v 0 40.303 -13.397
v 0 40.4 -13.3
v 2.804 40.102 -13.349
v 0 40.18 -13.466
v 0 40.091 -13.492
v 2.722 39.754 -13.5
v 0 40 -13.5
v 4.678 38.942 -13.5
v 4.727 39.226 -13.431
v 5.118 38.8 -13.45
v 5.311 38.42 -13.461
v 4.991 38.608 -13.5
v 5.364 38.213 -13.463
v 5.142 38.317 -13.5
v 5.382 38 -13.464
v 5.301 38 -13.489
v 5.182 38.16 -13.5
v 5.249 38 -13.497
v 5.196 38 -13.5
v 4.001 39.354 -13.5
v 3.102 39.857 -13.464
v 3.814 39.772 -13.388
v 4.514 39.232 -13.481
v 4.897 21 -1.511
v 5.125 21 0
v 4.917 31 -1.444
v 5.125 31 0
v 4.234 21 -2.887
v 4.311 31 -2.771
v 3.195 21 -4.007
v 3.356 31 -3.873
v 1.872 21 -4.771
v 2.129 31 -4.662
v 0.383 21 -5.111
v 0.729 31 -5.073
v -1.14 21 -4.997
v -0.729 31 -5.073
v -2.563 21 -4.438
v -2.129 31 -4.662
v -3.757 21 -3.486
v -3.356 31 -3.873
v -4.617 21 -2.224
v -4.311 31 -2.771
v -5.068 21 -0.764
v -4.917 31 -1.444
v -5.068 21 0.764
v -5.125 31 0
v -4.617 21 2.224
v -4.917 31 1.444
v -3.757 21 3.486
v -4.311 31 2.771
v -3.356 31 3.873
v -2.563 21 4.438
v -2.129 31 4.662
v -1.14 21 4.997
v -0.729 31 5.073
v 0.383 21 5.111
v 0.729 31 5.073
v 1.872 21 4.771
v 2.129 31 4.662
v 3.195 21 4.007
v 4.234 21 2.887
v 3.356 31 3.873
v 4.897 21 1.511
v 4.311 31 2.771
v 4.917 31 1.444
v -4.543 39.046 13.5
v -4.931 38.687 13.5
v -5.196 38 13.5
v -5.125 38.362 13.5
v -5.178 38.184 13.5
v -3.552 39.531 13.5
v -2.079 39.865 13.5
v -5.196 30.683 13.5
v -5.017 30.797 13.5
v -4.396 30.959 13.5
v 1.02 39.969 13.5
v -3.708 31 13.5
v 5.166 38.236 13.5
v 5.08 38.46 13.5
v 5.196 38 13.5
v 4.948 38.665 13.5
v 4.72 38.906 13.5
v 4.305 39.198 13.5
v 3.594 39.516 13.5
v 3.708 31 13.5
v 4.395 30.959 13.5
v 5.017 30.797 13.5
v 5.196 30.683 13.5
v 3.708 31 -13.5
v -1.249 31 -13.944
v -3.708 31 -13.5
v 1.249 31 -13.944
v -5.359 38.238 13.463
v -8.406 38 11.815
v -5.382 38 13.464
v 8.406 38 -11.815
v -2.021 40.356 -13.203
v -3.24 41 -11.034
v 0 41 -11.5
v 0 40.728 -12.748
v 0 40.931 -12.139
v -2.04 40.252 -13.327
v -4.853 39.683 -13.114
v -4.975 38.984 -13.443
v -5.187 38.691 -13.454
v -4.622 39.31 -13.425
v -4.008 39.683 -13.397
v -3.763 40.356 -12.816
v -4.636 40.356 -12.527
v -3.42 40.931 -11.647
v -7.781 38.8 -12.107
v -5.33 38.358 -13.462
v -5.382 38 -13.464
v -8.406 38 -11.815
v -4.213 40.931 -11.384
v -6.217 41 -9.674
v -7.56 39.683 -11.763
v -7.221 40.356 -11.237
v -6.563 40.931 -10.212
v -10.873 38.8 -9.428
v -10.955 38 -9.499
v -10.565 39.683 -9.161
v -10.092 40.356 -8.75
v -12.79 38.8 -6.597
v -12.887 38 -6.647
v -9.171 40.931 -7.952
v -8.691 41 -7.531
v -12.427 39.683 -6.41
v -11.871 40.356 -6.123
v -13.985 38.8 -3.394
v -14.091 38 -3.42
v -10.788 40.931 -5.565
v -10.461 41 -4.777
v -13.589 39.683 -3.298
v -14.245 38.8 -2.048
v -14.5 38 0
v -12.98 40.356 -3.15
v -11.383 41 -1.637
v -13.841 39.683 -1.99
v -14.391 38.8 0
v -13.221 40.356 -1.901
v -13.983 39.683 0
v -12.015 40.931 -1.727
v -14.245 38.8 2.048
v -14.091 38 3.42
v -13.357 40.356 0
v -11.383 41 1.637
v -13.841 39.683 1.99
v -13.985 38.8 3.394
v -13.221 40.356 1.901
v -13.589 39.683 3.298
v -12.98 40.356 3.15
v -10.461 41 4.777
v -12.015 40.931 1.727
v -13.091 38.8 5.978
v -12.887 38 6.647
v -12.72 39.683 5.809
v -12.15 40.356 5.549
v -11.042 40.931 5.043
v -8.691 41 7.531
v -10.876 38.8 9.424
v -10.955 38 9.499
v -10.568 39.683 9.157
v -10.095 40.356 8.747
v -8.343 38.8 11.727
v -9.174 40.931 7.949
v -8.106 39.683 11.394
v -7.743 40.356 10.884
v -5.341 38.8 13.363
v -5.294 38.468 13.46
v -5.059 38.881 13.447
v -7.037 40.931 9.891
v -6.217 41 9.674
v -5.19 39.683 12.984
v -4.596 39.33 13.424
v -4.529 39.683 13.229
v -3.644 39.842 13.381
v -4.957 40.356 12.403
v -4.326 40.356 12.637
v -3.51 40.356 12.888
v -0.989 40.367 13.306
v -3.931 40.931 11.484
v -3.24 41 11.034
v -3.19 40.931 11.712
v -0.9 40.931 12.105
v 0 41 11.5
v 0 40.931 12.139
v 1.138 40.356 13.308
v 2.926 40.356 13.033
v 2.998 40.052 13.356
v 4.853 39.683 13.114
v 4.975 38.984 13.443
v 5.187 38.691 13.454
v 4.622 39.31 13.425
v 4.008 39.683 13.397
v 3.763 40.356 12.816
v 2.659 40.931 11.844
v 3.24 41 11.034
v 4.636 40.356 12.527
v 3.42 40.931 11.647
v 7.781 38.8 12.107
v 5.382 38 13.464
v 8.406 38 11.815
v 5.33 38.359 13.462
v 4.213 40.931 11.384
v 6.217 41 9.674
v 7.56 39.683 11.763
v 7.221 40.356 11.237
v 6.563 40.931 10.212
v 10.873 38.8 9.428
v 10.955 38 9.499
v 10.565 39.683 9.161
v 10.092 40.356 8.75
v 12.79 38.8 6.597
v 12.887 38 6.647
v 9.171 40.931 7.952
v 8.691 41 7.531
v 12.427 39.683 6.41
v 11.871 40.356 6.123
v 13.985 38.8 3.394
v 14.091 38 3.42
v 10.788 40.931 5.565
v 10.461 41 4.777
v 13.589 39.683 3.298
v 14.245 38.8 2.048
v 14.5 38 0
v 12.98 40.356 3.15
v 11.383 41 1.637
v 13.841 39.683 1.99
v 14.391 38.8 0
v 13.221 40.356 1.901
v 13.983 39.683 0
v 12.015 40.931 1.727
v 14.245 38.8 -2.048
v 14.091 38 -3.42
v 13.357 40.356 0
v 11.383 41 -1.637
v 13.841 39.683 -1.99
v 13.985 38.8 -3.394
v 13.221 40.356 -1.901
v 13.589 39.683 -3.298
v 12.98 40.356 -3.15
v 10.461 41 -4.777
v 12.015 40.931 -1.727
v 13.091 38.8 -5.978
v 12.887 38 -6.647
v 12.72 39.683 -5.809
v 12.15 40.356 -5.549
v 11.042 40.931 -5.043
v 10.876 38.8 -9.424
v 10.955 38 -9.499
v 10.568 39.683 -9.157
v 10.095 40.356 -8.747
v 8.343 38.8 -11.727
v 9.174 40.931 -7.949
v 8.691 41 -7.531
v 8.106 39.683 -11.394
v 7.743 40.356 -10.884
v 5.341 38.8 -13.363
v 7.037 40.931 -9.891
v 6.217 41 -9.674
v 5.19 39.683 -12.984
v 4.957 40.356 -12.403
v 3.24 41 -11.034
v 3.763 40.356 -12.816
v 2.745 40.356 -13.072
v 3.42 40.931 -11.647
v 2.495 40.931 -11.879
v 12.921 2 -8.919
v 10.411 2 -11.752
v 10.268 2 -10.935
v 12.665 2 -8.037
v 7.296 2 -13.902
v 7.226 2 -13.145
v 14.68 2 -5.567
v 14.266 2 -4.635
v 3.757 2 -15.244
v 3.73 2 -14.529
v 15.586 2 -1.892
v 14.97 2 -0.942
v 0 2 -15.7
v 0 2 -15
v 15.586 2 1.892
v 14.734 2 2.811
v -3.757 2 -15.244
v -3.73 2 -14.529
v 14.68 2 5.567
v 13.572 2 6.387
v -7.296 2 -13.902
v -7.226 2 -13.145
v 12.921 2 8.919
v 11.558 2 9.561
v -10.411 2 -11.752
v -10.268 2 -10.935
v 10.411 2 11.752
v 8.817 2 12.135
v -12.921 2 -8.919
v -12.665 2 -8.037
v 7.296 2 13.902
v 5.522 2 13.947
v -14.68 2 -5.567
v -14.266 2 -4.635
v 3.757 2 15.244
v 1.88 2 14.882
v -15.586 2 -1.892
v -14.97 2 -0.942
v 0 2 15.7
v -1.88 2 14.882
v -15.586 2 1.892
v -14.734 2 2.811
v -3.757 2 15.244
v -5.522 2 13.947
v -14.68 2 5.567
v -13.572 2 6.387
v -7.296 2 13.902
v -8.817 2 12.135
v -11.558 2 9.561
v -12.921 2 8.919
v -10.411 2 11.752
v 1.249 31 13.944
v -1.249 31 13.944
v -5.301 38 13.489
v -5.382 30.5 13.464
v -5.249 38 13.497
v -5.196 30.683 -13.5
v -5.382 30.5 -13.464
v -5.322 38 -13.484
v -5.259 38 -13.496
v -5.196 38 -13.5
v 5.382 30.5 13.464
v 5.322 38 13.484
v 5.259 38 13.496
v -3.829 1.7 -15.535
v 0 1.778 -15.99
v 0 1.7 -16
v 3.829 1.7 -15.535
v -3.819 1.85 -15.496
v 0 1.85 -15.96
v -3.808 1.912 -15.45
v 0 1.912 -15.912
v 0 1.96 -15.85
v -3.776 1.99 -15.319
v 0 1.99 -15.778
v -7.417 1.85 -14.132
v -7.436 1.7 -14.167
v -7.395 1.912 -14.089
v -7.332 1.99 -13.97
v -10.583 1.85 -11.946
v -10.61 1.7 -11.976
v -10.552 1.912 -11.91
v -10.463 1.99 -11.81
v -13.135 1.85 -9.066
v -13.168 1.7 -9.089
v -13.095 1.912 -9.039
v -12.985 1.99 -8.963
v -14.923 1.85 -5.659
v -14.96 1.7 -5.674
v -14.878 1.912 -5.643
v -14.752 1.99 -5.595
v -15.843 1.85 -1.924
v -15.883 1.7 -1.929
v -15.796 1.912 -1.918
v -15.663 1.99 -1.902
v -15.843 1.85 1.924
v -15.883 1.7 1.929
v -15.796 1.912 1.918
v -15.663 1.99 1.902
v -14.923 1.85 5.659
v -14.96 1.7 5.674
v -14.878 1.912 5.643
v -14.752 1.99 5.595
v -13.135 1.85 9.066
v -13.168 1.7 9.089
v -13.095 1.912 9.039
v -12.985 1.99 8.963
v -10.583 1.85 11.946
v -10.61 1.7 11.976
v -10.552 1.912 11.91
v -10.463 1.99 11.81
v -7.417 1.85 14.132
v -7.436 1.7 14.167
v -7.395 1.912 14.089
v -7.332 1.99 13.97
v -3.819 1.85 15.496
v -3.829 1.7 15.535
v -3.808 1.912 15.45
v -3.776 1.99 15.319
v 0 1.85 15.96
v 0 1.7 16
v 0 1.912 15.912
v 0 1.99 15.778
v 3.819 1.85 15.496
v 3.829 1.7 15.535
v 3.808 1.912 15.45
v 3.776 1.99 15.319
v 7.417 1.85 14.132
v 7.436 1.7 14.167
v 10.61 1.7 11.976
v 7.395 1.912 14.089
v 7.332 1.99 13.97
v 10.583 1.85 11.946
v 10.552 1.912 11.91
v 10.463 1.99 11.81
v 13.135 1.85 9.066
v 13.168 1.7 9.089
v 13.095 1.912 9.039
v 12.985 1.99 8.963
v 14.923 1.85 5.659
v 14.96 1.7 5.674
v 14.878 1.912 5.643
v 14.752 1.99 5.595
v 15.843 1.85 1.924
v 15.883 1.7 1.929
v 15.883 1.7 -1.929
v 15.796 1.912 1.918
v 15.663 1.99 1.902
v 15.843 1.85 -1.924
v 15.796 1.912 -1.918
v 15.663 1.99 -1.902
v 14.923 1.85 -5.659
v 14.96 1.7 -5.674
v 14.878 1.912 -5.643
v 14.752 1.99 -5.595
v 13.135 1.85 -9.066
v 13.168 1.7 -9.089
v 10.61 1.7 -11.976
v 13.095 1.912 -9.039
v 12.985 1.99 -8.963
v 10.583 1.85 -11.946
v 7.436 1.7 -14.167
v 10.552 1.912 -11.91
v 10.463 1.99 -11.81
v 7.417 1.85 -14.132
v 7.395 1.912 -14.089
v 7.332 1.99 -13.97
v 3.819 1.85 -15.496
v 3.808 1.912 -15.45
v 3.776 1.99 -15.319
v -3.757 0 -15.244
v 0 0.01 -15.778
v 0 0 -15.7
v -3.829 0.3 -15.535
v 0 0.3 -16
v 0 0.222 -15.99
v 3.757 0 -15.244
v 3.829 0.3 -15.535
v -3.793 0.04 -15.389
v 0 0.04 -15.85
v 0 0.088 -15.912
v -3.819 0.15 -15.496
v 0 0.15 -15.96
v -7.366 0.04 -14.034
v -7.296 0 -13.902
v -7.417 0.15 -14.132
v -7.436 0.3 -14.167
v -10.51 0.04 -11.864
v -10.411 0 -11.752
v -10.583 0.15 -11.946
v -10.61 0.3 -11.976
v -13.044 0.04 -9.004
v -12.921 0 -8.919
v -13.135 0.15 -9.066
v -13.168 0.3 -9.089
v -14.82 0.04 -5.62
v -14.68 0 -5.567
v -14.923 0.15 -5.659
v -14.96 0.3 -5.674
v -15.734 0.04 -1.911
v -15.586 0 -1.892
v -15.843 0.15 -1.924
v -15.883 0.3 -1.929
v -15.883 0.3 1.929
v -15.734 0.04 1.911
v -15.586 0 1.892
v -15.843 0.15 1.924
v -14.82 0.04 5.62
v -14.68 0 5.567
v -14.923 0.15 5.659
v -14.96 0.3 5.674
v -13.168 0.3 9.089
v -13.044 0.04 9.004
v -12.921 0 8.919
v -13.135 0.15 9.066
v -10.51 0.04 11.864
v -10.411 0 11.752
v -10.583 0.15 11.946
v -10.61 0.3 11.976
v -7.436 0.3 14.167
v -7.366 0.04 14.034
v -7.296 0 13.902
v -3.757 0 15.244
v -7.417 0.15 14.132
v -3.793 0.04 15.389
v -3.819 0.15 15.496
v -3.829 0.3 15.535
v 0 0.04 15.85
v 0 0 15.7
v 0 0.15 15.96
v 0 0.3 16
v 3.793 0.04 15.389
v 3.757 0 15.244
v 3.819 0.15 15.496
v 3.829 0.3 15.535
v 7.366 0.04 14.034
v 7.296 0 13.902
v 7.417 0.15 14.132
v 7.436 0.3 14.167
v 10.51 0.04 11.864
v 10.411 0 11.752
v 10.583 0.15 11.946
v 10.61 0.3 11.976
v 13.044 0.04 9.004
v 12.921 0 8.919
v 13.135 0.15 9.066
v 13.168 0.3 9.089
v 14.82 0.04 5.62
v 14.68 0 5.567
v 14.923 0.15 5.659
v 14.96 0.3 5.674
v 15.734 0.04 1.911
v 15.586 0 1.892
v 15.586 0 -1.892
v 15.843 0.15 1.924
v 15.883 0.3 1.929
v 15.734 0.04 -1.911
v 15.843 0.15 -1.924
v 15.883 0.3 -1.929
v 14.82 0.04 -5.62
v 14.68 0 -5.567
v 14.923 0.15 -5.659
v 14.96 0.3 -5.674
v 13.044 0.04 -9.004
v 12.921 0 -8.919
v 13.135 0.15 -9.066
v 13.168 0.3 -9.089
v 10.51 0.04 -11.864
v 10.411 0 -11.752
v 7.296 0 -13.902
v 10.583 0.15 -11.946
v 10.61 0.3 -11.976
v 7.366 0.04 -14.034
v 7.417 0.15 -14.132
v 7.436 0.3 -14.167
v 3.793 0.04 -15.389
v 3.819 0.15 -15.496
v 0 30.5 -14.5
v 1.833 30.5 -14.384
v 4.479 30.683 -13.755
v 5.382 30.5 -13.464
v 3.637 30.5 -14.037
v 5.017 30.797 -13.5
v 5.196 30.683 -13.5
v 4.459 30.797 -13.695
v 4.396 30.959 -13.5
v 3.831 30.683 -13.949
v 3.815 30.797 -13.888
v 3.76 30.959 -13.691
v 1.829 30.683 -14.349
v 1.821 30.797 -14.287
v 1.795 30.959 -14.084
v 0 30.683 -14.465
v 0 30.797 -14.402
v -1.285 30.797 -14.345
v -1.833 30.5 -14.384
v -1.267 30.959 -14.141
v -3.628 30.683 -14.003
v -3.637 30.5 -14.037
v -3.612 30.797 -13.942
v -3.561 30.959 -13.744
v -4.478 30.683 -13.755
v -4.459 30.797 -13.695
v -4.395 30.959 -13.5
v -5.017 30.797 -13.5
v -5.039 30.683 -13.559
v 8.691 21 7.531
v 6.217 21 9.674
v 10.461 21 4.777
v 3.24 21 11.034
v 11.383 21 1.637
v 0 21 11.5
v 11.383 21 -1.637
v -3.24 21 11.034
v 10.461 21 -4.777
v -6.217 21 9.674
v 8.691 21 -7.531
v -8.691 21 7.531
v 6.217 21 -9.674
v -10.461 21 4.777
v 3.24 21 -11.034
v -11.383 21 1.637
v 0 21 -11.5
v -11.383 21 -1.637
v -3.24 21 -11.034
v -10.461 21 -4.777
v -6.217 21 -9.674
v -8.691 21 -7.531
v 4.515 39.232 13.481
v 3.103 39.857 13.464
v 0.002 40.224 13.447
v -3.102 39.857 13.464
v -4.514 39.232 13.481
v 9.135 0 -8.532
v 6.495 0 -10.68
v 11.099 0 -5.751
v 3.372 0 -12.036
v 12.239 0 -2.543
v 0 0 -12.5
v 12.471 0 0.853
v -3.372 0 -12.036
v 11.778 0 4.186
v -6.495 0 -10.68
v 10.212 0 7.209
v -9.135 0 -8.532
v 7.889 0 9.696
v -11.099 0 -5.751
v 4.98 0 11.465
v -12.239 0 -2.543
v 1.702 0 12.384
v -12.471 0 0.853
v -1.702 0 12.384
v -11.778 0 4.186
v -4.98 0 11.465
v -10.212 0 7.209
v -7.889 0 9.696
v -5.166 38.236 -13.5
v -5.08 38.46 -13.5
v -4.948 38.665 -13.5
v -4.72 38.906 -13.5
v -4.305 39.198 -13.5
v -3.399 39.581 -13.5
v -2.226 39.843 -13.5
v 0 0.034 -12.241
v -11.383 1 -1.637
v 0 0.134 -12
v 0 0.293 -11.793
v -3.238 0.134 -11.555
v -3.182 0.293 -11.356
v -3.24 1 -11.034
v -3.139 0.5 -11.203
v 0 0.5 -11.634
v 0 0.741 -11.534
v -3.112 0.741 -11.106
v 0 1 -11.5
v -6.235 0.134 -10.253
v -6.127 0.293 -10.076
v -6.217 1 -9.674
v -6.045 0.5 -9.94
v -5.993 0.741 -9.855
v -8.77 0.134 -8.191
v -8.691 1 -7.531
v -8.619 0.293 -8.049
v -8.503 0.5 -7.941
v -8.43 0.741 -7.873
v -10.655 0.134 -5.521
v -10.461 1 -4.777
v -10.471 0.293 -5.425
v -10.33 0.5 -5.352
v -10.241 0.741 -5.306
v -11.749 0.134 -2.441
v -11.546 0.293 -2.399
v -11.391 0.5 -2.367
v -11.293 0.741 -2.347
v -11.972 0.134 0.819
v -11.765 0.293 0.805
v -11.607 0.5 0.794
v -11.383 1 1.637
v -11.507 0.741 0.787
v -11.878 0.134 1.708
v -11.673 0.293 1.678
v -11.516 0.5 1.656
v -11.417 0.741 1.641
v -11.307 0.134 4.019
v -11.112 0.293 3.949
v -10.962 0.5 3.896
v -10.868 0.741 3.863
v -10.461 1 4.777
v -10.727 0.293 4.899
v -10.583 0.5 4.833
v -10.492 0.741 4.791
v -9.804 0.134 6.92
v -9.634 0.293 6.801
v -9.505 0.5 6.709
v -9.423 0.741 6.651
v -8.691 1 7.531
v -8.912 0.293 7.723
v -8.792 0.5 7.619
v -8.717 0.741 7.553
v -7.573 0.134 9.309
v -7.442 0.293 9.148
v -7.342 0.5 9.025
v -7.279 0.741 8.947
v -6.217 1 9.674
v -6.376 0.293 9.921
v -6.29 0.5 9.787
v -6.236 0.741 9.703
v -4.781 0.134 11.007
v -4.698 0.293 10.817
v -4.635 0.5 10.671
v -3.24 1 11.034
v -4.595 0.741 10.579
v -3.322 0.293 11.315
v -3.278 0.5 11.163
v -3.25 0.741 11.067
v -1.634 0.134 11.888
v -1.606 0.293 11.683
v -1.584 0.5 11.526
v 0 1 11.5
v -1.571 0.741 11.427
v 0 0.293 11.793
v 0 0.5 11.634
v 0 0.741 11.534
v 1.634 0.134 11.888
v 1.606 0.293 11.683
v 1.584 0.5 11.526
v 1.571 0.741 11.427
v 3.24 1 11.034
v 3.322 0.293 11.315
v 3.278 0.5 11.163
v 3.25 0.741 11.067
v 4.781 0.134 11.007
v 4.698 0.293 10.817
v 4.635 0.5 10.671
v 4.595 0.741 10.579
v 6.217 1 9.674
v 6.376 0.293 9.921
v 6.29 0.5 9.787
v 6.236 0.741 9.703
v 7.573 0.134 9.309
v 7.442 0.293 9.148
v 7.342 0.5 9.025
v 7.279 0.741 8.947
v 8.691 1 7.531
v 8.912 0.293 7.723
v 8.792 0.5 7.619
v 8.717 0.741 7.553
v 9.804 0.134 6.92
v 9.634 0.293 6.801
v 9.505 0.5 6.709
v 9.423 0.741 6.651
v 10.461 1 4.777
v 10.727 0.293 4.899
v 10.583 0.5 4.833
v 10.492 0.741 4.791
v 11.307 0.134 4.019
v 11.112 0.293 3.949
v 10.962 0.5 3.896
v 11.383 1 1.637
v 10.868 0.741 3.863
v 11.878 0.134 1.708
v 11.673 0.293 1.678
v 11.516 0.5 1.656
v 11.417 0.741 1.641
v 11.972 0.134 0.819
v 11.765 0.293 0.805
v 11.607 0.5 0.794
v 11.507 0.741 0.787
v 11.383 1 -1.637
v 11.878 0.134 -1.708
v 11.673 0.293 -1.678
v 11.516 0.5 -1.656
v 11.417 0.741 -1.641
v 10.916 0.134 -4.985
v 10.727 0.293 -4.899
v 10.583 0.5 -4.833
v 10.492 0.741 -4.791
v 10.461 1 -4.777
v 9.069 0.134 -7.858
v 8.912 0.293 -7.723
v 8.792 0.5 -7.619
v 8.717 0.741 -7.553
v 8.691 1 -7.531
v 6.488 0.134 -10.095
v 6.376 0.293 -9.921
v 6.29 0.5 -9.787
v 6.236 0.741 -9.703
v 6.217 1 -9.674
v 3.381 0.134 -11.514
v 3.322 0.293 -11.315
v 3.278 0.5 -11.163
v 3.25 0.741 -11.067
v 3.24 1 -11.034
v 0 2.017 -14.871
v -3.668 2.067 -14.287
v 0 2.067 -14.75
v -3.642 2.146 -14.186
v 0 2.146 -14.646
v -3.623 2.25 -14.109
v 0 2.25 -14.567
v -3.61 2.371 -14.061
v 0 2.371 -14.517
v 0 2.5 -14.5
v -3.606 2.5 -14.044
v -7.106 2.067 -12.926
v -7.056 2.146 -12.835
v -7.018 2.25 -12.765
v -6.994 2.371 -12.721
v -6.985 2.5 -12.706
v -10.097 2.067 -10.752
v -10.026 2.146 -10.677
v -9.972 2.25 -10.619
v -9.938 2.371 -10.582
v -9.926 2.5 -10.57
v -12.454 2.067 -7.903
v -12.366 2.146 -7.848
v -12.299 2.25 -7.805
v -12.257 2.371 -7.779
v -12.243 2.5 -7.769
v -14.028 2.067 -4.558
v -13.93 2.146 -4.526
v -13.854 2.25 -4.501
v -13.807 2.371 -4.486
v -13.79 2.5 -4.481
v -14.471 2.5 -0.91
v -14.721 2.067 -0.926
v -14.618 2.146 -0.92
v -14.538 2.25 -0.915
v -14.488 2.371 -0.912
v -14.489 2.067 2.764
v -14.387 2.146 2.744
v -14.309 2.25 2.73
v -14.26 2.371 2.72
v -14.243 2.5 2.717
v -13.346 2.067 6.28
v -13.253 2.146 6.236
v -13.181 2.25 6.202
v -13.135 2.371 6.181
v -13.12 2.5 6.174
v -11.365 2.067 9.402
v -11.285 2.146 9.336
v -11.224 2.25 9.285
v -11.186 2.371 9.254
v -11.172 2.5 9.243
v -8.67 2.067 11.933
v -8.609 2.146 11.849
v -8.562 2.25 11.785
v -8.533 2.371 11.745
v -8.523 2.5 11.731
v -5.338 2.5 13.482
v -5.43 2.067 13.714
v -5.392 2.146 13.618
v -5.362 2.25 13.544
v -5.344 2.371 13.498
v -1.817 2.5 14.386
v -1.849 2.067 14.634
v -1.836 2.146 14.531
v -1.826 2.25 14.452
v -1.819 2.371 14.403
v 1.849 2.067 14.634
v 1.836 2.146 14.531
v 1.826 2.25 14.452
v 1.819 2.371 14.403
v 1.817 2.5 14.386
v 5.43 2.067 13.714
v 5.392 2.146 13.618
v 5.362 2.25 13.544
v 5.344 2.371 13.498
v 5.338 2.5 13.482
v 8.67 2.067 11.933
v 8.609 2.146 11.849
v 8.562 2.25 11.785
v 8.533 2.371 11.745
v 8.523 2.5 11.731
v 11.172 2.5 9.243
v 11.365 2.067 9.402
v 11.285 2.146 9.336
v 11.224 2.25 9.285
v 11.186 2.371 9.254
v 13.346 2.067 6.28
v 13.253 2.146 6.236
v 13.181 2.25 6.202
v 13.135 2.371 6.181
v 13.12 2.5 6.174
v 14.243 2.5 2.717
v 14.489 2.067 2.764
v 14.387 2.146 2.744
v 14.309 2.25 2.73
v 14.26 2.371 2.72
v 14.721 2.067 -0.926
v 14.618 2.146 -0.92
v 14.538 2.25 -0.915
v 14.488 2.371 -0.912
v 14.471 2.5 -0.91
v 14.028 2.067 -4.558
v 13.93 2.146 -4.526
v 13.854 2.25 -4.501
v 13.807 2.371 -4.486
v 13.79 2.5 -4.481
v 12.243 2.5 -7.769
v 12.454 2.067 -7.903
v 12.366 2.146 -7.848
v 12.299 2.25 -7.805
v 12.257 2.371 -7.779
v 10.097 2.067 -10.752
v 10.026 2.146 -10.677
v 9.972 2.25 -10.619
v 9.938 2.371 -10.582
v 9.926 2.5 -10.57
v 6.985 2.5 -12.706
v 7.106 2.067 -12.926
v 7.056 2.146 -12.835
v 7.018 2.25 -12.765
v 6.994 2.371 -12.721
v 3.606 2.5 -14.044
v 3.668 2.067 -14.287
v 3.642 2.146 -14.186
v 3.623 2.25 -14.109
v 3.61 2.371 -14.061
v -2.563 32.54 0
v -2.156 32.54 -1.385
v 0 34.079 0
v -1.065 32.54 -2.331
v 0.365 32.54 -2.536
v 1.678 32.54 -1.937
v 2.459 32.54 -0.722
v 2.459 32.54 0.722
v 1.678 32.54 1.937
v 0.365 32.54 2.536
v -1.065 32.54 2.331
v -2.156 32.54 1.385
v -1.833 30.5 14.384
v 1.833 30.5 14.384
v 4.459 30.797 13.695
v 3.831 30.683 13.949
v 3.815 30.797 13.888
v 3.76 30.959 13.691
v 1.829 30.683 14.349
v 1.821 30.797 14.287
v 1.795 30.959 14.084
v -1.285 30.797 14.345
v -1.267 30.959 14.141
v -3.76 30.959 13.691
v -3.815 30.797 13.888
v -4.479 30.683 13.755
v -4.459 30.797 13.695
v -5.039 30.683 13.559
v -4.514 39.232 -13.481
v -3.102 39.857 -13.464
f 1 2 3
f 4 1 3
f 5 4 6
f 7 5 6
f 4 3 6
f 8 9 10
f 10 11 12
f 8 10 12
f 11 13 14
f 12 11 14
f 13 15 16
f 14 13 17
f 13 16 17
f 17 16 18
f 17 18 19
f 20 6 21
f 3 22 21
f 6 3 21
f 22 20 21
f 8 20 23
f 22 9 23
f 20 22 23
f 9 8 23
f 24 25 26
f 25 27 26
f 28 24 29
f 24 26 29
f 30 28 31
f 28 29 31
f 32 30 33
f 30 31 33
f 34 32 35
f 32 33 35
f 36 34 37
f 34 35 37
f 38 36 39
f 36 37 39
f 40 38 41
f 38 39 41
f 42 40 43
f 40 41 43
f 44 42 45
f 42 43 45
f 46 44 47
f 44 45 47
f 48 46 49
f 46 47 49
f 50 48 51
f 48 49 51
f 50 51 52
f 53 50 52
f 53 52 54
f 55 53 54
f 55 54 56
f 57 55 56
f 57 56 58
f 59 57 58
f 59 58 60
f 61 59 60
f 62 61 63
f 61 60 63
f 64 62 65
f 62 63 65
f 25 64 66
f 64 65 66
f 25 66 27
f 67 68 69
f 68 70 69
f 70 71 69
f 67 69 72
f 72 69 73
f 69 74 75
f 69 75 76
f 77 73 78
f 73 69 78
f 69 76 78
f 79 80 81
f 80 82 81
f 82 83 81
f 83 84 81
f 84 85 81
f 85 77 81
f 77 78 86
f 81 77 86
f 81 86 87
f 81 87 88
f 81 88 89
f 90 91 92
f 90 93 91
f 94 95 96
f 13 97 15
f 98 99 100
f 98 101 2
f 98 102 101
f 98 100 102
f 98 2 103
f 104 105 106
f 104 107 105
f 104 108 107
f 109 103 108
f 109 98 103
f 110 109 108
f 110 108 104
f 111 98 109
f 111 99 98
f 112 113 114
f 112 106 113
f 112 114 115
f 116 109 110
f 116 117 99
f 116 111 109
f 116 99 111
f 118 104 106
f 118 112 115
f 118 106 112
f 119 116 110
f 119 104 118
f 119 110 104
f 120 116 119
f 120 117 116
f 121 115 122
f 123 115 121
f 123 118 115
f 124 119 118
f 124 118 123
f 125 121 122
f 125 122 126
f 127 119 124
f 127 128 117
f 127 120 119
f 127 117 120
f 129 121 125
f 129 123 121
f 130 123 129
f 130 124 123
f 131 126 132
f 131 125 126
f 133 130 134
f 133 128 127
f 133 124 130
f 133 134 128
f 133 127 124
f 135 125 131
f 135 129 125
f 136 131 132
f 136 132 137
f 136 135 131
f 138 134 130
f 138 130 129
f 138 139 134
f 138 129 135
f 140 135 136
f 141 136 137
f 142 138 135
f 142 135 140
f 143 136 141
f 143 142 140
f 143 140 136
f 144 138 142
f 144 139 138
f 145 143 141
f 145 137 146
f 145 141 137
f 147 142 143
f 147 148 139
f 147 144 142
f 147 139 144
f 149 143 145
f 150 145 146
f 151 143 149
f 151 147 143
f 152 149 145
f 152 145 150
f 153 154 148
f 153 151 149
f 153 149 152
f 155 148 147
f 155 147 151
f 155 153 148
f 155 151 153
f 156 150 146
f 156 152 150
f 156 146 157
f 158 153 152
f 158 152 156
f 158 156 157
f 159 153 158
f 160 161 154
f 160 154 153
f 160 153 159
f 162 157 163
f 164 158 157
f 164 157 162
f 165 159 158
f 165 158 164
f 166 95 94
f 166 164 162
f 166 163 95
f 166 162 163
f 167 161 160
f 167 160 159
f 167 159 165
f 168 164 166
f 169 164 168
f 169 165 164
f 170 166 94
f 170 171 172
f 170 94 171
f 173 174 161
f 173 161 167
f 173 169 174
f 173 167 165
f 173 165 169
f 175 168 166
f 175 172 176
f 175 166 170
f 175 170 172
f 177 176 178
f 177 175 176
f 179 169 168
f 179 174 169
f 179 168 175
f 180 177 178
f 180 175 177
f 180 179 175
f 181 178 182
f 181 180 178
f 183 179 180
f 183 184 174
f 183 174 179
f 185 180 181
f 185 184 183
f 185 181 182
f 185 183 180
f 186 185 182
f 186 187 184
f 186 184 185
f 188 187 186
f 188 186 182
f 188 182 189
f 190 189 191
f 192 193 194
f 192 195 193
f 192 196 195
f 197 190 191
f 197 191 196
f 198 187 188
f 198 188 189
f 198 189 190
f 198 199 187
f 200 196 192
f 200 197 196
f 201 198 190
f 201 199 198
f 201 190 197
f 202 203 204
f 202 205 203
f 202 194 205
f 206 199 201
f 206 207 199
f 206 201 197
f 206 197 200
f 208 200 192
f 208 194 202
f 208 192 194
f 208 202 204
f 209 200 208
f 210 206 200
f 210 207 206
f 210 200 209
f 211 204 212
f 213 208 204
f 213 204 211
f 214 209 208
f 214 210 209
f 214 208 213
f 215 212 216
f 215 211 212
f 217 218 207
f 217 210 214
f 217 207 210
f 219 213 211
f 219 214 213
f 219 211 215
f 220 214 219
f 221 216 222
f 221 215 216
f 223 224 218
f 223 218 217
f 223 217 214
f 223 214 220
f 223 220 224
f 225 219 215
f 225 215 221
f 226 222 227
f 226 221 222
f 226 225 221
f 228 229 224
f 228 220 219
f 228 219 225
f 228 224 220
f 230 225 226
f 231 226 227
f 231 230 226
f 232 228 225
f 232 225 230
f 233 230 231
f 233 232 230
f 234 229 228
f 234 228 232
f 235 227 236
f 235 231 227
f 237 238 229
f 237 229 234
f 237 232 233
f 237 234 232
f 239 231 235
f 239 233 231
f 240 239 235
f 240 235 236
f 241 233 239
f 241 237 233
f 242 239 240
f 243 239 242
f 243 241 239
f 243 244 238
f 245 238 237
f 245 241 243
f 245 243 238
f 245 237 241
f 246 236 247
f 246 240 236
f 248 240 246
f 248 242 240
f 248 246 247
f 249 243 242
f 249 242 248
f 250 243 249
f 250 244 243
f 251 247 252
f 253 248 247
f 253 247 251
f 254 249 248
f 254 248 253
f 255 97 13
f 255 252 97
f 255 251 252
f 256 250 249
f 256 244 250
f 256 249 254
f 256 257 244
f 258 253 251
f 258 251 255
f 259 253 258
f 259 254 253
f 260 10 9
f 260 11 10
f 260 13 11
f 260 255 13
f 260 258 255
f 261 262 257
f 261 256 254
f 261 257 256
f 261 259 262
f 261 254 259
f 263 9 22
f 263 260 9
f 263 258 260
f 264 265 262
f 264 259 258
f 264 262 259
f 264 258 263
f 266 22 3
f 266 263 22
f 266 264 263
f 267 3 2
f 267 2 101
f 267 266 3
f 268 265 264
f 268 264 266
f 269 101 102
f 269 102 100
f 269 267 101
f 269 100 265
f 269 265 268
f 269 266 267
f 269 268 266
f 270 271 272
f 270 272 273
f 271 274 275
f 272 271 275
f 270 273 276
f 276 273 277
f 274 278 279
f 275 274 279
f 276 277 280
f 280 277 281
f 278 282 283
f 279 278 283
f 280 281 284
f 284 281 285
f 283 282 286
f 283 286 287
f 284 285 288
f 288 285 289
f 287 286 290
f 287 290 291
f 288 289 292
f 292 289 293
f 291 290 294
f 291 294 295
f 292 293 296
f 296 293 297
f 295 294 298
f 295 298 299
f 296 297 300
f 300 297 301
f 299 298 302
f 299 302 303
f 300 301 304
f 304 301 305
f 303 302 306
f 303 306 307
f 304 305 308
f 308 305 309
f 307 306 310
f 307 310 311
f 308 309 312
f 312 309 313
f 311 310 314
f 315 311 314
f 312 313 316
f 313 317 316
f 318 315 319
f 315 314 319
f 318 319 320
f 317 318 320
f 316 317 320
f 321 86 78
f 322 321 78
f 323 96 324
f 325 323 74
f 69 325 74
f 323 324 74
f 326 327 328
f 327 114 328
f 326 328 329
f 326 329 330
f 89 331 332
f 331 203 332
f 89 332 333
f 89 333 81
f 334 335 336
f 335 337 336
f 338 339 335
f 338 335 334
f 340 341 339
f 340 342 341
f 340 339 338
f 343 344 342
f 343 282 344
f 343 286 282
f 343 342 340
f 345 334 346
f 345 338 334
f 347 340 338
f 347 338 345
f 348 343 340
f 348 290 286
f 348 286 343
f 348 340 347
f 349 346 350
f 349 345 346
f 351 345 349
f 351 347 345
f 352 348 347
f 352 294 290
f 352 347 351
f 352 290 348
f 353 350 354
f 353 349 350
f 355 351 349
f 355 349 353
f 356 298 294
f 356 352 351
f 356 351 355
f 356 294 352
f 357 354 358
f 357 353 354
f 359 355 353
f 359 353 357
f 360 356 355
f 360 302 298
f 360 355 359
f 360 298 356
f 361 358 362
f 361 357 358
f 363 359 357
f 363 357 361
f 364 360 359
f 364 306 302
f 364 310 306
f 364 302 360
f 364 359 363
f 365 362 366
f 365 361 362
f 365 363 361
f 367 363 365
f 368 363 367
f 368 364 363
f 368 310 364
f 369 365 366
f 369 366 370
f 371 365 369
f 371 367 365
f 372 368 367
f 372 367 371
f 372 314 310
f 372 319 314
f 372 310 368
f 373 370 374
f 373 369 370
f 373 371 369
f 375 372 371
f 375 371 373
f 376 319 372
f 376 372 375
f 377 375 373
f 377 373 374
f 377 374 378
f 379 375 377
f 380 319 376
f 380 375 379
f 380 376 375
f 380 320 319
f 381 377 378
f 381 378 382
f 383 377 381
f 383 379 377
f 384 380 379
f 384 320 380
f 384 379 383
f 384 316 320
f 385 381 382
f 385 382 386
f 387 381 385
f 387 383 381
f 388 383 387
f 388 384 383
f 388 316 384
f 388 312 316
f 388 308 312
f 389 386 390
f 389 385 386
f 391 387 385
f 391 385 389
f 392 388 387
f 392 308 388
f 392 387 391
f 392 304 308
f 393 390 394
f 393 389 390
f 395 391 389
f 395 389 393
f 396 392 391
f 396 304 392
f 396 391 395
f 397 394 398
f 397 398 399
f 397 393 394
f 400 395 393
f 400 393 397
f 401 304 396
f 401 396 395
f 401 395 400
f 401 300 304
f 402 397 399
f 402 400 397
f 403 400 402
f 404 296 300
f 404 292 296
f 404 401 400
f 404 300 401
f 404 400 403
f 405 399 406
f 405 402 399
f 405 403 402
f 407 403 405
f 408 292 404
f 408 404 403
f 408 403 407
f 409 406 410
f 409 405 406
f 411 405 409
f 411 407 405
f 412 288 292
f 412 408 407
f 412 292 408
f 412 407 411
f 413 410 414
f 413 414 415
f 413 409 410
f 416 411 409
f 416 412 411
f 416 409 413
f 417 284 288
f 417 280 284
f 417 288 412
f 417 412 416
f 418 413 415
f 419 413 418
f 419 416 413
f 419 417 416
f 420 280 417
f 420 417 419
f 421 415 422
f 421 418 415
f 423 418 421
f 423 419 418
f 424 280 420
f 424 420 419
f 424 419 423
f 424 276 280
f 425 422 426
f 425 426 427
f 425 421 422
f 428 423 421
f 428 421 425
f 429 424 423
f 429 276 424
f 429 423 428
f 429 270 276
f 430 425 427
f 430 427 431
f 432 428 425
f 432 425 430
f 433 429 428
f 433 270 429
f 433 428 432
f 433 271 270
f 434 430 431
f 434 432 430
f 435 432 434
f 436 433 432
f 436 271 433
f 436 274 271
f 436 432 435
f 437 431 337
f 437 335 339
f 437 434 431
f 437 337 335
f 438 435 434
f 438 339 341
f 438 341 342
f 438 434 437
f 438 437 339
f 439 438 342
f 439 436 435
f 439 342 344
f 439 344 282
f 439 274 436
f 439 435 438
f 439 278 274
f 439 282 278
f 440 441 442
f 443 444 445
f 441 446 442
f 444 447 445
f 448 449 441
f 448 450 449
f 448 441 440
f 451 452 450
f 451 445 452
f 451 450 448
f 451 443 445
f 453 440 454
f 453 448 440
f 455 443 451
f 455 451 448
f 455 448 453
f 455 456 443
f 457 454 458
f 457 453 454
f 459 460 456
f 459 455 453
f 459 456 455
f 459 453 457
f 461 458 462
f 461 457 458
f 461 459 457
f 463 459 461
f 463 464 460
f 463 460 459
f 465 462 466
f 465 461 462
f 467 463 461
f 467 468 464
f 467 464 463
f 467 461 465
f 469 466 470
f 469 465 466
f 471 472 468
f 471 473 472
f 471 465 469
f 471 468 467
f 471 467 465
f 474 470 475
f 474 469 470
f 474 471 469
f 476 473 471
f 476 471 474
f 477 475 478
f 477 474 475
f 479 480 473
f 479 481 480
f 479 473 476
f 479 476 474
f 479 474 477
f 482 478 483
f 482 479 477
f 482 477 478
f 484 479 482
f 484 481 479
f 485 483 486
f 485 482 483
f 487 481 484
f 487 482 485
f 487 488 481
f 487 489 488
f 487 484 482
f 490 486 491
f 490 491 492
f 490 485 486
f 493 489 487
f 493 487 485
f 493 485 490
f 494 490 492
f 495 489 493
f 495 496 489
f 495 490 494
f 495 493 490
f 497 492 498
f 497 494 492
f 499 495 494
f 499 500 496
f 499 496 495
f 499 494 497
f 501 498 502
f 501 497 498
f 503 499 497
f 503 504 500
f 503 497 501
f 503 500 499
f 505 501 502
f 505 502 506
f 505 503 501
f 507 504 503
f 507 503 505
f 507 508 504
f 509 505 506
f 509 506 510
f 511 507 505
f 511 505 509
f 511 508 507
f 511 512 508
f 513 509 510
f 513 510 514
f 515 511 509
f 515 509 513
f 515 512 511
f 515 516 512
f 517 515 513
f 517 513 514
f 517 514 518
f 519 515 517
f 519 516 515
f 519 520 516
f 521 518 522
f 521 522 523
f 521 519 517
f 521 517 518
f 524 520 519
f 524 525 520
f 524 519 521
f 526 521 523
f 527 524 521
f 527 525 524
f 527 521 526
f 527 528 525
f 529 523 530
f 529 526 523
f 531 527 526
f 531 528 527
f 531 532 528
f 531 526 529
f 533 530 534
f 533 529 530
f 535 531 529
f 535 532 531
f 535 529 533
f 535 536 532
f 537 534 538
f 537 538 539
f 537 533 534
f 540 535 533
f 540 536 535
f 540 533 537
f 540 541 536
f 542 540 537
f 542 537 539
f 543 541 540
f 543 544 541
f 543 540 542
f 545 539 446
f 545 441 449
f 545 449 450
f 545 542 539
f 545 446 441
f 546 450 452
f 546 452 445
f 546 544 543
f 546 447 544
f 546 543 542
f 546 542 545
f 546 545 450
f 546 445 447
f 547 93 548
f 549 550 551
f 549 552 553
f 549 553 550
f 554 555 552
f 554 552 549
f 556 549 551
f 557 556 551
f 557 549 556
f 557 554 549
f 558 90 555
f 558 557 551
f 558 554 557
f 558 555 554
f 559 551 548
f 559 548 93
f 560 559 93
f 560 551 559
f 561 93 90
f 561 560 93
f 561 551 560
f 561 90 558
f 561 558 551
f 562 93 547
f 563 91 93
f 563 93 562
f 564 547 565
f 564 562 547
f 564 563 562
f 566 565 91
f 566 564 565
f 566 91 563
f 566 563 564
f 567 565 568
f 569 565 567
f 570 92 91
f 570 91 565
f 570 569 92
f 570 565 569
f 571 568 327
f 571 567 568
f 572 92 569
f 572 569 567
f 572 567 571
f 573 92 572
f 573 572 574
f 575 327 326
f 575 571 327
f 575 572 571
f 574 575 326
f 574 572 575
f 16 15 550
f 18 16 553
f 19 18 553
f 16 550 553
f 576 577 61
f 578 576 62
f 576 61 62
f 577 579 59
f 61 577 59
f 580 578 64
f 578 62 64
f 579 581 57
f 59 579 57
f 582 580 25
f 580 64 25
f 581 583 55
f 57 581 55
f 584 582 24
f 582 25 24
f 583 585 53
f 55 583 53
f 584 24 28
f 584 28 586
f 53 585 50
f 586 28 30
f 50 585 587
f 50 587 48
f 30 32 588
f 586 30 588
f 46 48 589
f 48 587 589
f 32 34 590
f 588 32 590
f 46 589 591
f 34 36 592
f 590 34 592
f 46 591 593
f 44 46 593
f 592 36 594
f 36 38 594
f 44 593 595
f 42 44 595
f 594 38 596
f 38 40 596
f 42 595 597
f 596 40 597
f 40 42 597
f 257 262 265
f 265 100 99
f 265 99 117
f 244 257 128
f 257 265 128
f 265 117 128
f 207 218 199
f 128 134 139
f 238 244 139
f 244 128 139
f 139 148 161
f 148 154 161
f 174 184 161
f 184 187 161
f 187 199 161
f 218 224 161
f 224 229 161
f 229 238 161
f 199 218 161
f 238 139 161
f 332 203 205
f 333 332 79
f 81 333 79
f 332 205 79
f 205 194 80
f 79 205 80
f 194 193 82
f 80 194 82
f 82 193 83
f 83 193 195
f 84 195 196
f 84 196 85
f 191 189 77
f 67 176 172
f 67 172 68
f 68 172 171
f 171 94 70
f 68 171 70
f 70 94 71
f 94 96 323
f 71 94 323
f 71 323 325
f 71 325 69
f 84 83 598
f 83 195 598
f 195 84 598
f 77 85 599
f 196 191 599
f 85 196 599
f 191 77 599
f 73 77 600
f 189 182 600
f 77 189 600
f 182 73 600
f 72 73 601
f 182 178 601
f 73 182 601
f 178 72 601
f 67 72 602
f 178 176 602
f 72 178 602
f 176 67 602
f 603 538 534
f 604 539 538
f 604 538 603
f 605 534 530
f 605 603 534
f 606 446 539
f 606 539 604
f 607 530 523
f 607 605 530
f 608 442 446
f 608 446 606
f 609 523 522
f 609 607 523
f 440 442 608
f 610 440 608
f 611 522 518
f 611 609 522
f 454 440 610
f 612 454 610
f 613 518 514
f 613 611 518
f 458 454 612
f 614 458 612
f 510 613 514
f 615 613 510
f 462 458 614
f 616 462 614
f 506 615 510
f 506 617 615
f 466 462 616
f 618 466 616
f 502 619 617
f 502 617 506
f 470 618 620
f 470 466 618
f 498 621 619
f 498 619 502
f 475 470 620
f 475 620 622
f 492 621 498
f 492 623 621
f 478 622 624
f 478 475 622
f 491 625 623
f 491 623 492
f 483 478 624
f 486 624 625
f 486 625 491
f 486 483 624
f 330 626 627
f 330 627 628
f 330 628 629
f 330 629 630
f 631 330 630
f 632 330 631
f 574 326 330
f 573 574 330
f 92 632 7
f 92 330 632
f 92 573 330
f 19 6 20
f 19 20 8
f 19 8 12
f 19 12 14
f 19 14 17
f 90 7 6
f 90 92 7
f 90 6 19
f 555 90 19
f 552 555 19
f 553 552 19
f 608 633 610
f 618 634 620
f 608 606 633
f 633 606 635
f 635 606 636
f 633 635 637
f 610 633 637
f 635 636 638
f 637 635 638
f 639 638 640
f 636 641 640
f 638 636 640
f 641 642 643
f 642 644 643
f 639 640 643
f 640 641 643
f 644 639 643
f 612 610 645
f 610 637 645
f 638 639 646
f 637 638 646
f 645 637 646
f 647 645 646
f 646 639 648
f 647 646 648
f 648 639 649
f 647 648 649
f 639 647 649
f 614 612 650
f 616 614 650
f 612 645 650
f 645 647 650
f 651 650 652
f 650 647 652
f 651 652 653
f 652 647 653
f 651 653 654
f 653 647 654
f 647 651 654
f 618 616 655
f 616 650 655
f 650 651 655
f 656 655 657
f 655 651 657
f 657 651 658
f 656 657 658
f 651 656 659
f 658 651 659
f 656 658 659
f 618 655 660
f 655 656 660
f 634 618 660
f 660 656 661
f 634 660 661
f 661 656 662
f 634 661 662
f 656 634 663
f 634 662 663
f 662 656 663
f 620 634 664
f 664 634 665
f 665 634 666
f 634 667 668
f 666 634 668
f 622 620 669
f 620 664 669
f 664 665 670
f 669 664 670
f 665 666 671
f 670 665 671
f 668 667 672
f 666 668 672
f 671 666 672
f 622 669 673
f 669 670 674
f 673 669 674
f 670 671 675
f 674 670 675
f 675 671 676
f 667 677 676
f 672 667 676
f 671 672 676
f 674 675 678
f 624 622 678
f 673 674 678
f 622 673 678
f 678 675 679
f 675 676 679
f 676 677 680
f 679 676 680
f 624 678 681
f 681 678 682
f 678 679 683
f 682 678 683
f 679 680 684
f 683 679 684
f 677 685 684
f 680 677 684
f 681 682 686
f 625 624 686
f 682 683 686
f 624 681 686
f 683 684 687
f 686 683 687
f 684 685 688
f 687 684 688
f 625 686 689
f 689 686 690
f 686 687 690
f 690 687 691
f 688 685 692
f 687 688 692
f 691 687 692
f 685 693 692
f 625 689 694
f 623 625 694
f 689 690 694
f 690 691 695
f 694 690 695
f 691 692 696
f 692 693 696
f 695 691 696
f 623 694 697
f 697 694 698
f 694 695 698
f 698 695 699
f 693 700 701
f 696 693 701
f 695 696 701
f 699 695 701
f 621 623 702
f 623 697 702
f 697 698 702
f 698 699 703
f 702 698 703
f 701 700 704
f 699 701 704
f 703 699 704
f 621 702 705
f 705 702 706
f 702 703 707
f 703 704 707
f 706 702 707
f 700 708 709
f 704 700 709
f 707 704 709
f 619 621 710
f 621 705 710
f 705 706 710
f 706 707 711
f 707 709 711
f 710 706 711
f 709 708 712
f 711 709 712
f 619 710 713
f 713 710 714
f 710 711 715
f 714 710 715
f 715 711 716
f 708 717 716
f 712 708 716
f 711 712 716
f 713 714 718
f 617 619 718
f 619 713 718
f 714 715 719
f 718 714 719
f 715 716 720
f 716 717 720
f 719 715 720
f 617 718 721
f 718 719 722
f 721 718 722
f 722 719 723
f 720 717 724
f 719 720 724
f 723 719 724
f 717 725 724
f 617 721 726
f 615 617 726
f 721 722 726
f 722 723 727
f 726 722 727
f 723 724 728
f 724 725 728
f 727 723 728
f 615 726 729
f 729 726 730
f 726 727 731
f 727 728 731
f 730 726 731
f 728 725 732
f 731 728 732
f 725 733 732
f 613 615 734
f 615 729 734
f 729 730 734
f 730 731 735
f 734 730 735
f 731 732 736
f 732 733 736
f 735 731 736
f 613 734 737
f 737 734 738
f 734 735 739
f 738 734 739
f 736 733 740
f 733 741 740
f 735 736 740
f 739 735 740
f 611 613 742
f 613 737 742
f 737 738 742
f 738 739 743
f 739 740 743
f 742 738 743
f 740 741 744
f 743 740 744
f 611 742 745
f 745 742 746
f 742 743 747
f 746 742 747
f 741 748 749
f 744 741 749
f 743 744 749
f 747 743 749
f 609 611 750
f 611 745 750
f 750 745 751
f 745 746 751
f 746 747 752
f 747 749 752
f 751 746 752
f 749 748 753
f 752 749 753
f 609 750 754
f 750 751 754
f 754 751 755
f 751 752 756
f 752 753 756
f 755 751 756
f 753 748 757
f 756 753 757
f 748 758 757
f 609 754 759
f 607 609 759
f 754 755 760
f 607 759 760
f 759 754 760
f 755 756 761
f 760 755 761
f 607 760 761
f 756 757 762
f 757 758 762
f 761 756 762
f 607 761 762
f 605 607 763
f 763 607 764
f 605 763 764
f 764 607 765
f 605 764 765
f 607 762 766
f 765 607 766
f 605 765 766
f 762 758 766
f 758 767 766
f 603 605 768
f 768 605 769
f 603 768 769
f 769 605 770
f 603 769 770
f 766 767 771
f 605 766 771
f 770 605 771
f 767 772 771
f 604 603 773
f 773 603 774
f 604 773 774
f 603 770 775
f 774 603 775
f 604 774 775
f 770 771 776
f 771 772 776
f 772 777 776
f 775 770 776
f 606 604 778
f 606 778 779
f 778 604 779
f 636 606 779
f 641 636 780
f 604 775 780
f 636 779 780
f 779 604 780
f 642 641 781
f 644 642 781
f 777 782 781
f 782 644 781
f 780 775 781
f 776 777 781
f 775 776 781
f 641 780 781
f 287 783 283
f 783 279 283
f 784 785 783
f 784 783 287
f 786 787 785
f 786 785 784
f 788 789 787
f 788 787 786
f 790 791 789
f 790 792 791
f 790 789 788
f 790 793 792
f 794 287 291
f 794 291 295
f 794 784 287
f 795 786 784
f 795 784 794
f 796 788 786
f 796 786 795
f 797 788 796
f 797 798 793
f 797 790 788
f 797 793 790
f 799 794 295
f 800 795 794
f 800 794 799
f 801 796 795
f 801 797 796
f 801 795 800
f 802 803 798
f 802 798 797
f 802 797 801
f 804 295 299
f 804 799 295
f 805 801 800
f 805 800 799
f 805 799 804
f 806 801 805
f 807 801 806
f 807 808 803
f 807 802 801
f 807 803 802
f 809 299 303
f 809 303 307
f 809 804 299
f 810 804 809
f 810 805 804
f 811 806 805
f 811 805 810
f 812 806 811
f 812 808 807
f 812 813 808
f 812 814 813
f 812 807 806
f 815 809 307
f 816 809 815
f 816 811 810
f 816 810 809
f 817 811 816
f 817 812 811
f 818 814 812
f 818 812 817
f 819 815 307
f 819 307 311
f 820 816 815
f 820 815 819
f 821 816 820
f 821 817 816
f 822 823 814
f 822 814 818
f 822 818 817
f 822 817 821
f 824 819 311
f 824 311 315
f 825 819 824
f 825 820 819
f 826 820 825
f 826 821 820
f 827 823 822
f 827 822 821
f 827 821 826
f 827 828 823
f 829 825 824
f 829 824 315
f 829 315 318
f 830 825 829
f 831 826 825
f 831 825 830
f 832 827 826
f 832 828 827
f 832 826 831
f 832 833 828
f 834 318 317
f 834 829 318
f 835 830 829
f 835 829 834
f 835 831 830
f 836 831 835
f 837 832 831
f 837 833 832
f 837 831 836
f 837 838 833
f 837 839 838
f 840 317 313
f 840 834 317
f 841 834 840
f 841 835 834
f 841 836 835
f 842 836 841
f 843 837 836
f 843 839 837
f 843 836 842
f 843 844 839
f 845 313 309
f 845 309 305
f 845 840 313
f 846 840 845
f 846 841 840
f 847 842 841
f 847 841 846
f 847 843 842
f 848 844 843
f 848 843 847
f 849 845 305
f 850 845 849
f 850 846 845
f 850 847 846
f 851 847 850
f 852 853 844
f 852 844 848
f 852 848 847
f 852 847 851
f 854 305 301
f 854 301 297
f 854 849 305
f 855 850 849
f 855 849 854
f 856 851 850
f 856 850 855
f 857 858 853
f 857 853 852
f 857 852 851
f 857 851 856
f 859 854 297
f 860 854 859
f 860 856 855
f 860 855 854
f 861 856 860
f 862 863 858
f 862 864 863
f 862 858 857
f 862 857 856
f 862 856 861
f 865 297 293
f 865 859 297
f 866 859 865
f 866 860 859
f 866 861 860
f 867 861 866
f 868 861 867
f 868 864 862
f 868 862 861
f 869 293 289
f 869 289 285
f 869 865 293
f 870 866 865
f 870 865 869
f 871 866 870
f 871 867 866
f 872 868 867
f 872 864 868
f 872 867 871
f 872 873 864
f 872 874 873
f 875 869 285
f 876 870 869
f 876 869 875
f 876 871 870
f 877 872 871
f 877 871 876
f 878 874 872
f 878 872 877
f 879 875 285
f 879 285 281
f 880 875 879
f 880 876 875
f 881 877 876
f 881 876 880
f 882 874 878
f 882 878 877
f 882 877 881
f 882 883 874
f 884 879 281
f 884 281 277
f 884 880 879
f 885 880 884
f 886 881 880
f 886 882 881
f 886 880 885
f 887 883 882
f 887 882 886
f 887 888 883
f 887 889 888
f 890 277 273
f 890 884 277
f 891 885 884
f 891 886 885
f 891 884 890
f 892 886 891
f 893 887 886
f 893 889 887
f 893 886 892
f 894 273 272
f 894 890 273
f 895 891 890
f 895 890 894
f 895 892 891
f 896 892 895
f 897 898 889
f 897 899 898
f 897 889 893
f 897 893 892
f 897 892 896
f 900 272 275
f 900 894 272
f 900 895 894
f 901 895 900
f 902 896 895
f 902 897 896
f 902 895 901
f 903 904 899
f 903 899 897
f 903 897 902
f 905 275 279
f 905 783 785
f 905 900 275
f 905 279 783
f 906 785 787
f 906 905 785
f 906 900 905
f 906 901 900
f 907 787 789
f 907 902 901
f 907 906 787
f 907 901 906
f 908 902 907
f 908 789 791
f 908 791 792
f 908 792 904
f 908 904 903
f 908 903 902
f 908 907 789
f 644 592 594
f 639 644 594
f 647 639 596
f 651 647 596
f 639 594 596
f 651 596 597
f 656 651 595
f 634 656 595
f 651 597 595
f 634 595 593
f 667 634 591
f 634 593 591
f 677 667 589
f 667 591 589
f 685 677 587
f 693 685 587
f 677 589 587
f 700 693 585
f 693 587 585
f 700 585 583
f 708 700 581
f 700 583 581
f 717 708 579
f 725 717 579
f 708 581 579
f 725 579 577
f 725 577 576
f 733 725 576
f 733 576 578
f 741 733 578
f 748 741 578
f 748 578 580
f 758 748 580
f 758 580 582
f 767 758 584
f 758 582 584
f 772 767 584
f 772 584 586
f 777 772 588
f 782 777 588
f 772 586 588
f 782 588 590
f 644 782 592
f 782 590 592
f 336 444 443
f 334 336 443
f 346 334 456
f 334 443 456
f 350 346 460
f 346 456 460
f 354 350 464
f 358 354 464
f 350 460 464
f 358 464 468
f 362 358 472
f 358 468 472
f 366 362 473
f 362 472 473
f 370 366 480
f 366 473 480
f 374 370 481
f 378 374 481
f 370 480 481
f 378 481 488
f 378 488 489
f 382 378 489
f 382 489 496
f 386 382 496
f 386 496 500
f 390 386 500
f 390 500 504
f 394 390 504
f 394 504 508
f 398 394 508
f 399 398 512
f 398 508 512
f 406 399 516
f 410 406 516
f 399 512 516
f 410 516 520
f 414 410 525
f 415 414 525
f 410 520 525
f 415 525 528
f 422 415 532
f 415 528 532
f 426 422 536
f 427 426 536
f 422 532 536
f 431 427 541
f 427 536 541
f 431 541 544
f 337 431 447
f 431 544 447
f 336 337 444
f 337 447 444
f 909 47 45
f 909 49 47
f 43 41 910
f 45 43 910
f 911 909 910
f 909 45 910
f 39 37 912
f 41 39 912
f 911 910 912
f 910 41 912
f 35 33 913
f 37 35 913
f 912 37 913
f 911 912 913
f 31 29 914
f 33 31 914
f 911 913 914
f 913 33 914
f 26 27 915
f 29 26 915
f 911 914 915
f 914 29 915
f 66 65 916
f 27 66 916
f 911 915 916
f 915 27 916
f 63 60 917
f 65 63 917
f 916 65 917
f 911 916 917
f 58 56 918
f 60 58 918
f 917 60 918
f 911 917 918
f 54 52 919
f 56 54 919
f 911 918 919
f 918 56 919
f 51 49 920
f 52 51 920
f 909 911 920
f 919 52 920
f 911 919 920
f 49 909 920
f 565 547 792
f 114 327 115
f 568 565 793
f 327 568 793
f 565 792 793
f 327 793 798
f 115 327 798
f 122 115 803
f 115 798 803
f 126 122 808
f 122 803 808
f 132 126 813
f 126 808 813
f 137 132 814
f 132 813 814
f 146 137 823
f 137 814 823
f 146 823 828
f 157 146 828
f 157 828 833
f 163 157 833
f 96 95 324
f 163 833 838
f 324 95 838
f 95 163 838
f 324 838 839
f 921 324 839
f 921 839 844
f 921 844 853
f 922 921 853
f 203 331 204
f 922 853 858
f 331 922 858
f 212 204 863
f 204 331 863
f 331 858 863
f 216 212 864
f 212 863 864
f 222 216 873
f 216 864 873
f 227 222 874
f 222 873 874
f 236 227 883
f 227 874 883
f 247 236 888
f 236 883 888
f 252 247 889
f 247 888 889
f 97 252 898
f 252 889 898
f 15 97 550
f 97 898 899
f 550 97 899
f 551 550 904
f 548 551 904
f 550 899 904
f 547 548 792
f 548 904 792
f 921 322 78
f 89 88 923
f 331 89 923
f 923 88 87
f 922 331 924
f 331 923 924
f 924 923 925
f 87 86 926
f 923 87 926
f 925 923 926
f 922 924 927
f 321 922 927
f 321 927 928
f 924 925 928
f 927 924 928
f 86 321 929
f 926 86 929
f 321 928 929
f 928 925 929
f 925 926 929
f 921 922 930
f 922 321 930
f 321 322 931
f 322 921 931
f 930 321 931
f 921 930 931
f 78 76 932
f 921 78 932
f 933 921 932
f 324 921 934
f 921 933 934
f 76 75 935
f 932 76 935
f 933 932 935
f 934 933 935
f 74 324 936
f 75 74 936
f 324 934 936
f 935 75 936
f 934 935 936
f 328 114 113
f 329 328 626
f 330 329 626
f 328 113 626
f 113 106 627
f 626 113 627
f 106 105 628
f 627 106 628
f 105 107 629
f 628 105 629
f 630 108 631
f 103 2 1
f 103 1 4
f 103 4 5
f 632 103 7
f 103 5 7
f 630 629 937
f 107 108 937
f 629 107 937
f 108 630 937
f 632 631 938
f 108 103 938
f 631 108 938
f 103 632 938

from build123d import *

# Parameters (mm, degrees)
PERFORADOR_PARA_ROSCAR_HELICOIL_DE_M121_D     = 10.25
PERFORADOR_PARA_ROSCAR_HELICOIL_DE_M121_DEPTH = 10
PERFORADOR_PARA_ROSCAR_HELICOIL_DE_M121_TIP   = 3.079410673
REDONDEO1_R                                   = 1
REDONDEO2_R                                   = 0.3
REDONDEO3_R                                   = 0.5
REDONDEO4_R                                   = 3
CORTAR_EXTRUIR1_START                         = -10
CORTAR_EXTRUIR1_DEPTH                         = 10
REDONDEO5_R                                   = 0.5


with BuildPart() as part:
    # Croquis1 → Revolución1 (revolve)
    with BuildSketch(Plane.XY, mode=Mode.PRIVATE) as revoluci_n1_sk:
        Polygon((0, 41), (14.5, 41), (14.5, 2), (16, 2), (16, 0), (14.5, 0), (11.5, 0), (11.5, 21), (0, 21), align=None)
    revolve(revoluci_n1_sk.sketch.rotate(Axis((0, 0, 0), (0, 1, 0)), 90), axis=Axis((0, 0, 0), (0, 1, 0)))

    # Perforador para roscar Helicoil de M121
    with Locations(Plane(origin=(0, 21, 0), x_dir=(-1, 0, 0), z_dir=(0, -1, 0))):
        with Locations((0, 0)):
            Hole(PERFORADOR_PARA_ROSCAR_HELICOIL_DE_M121_D / 2, depth=PERFORADOR_PARA_ROSCAR_HELICOIL_DE_M121_DEPTH)
            with Locations((0, 0, -(PERFORADOR_PARA_ROSCAR_HELICOIL_DE_M121_DEPTH + PERFORADOR_PARA_ROSCAR_HELICOIL_DE_M121_TIP / 2))):  # 118° drill point
                Cone(0, PERFORADOR_PARA_ROSCAR_HELICOIL_DE_M121_D / 2, PERFORADOR_PARA_ROSCAR_HELICOIL_DE_M121_TIP, mode=Mode.SUBTRACT)

    # Redondeo1
    redondeo1_edges = [part.edges().sort_by_distance(p)[0] for p in [
        (0, 0, 11.5),
    ]]
    fillet(redondeo1_edges, radius=REDONDEO1_R)

    # Redondeo2
    redondeo2_edges = [part.edges().sort_by_distance(p)[0] for p in [
        (0, 0, 16),
        (0, 2, 16),
    ]]
    fillet(redondeo2_edges, radius=REDONDEO2_R)

    # Redondeo3
    redondeo3_edges = [part.edges().sort_by_distance(p)[0] for p in [
        (0, 2, 14.5),
    ]]
    fillet(redondeo3_edges, radius=REDONDEO3_R)

    # Redondeo4
    redondeo4_edges = [part.edges().sort_by_distance(p)[0] for p in [
        (0, 41, 14.5),
    ]]
    fillet(redondeo4_edges, radius=REDONDEO4_R)

    # Croquis5 → Cortar-Extruir1 (cut)
    with BuildSketch(Plane(origin=(0, 41, 0), x_dir=(1, 0, 0), z_dir=(0, 1, 0)).offset(CORTAR_EXTRUIR1_START)):
        with BuildLine():
            Line((-5.291502622, 13.5), (5.291502622, 13.5))
            ThreePointArc((5.291502622, 13.5), (0, 14.5), (-5.291502622, 13.5))
        make_face()
        with BuildLine():
            Line((-5.291502622, -13.5), (5.291502622, -13.5))
            ThreePointArc((5.291502622, -13.5), (0, -14.5), (-5.291502622, -13.5))
        make_face()
    extrude(amount=CORTAR_EXTRUIR1_DEPTH, mode=Mode.SUBTRACT)

    # Redondeo5
    redondeo5_edges = [part.edges().sort_by_distance(p)[0] for p in [
        (5.291502622, 34.5, 13.5),
        (-5.291502622, 34.5, -13.5),
        (-5.291502622, 34.5, -13.5),
        (-2.692582404, 31, -14.247806849),
        (5.291502622, 34.5, -13.5),
        (5.291502622, 34.5, 13.5),
        (0, 31, 14.5),
        (-5.291502622, 34.5, 13.5),
    ]]
    fillet(redondeo5_edges, radius=REDONDEO5_R)


solid = part.part
